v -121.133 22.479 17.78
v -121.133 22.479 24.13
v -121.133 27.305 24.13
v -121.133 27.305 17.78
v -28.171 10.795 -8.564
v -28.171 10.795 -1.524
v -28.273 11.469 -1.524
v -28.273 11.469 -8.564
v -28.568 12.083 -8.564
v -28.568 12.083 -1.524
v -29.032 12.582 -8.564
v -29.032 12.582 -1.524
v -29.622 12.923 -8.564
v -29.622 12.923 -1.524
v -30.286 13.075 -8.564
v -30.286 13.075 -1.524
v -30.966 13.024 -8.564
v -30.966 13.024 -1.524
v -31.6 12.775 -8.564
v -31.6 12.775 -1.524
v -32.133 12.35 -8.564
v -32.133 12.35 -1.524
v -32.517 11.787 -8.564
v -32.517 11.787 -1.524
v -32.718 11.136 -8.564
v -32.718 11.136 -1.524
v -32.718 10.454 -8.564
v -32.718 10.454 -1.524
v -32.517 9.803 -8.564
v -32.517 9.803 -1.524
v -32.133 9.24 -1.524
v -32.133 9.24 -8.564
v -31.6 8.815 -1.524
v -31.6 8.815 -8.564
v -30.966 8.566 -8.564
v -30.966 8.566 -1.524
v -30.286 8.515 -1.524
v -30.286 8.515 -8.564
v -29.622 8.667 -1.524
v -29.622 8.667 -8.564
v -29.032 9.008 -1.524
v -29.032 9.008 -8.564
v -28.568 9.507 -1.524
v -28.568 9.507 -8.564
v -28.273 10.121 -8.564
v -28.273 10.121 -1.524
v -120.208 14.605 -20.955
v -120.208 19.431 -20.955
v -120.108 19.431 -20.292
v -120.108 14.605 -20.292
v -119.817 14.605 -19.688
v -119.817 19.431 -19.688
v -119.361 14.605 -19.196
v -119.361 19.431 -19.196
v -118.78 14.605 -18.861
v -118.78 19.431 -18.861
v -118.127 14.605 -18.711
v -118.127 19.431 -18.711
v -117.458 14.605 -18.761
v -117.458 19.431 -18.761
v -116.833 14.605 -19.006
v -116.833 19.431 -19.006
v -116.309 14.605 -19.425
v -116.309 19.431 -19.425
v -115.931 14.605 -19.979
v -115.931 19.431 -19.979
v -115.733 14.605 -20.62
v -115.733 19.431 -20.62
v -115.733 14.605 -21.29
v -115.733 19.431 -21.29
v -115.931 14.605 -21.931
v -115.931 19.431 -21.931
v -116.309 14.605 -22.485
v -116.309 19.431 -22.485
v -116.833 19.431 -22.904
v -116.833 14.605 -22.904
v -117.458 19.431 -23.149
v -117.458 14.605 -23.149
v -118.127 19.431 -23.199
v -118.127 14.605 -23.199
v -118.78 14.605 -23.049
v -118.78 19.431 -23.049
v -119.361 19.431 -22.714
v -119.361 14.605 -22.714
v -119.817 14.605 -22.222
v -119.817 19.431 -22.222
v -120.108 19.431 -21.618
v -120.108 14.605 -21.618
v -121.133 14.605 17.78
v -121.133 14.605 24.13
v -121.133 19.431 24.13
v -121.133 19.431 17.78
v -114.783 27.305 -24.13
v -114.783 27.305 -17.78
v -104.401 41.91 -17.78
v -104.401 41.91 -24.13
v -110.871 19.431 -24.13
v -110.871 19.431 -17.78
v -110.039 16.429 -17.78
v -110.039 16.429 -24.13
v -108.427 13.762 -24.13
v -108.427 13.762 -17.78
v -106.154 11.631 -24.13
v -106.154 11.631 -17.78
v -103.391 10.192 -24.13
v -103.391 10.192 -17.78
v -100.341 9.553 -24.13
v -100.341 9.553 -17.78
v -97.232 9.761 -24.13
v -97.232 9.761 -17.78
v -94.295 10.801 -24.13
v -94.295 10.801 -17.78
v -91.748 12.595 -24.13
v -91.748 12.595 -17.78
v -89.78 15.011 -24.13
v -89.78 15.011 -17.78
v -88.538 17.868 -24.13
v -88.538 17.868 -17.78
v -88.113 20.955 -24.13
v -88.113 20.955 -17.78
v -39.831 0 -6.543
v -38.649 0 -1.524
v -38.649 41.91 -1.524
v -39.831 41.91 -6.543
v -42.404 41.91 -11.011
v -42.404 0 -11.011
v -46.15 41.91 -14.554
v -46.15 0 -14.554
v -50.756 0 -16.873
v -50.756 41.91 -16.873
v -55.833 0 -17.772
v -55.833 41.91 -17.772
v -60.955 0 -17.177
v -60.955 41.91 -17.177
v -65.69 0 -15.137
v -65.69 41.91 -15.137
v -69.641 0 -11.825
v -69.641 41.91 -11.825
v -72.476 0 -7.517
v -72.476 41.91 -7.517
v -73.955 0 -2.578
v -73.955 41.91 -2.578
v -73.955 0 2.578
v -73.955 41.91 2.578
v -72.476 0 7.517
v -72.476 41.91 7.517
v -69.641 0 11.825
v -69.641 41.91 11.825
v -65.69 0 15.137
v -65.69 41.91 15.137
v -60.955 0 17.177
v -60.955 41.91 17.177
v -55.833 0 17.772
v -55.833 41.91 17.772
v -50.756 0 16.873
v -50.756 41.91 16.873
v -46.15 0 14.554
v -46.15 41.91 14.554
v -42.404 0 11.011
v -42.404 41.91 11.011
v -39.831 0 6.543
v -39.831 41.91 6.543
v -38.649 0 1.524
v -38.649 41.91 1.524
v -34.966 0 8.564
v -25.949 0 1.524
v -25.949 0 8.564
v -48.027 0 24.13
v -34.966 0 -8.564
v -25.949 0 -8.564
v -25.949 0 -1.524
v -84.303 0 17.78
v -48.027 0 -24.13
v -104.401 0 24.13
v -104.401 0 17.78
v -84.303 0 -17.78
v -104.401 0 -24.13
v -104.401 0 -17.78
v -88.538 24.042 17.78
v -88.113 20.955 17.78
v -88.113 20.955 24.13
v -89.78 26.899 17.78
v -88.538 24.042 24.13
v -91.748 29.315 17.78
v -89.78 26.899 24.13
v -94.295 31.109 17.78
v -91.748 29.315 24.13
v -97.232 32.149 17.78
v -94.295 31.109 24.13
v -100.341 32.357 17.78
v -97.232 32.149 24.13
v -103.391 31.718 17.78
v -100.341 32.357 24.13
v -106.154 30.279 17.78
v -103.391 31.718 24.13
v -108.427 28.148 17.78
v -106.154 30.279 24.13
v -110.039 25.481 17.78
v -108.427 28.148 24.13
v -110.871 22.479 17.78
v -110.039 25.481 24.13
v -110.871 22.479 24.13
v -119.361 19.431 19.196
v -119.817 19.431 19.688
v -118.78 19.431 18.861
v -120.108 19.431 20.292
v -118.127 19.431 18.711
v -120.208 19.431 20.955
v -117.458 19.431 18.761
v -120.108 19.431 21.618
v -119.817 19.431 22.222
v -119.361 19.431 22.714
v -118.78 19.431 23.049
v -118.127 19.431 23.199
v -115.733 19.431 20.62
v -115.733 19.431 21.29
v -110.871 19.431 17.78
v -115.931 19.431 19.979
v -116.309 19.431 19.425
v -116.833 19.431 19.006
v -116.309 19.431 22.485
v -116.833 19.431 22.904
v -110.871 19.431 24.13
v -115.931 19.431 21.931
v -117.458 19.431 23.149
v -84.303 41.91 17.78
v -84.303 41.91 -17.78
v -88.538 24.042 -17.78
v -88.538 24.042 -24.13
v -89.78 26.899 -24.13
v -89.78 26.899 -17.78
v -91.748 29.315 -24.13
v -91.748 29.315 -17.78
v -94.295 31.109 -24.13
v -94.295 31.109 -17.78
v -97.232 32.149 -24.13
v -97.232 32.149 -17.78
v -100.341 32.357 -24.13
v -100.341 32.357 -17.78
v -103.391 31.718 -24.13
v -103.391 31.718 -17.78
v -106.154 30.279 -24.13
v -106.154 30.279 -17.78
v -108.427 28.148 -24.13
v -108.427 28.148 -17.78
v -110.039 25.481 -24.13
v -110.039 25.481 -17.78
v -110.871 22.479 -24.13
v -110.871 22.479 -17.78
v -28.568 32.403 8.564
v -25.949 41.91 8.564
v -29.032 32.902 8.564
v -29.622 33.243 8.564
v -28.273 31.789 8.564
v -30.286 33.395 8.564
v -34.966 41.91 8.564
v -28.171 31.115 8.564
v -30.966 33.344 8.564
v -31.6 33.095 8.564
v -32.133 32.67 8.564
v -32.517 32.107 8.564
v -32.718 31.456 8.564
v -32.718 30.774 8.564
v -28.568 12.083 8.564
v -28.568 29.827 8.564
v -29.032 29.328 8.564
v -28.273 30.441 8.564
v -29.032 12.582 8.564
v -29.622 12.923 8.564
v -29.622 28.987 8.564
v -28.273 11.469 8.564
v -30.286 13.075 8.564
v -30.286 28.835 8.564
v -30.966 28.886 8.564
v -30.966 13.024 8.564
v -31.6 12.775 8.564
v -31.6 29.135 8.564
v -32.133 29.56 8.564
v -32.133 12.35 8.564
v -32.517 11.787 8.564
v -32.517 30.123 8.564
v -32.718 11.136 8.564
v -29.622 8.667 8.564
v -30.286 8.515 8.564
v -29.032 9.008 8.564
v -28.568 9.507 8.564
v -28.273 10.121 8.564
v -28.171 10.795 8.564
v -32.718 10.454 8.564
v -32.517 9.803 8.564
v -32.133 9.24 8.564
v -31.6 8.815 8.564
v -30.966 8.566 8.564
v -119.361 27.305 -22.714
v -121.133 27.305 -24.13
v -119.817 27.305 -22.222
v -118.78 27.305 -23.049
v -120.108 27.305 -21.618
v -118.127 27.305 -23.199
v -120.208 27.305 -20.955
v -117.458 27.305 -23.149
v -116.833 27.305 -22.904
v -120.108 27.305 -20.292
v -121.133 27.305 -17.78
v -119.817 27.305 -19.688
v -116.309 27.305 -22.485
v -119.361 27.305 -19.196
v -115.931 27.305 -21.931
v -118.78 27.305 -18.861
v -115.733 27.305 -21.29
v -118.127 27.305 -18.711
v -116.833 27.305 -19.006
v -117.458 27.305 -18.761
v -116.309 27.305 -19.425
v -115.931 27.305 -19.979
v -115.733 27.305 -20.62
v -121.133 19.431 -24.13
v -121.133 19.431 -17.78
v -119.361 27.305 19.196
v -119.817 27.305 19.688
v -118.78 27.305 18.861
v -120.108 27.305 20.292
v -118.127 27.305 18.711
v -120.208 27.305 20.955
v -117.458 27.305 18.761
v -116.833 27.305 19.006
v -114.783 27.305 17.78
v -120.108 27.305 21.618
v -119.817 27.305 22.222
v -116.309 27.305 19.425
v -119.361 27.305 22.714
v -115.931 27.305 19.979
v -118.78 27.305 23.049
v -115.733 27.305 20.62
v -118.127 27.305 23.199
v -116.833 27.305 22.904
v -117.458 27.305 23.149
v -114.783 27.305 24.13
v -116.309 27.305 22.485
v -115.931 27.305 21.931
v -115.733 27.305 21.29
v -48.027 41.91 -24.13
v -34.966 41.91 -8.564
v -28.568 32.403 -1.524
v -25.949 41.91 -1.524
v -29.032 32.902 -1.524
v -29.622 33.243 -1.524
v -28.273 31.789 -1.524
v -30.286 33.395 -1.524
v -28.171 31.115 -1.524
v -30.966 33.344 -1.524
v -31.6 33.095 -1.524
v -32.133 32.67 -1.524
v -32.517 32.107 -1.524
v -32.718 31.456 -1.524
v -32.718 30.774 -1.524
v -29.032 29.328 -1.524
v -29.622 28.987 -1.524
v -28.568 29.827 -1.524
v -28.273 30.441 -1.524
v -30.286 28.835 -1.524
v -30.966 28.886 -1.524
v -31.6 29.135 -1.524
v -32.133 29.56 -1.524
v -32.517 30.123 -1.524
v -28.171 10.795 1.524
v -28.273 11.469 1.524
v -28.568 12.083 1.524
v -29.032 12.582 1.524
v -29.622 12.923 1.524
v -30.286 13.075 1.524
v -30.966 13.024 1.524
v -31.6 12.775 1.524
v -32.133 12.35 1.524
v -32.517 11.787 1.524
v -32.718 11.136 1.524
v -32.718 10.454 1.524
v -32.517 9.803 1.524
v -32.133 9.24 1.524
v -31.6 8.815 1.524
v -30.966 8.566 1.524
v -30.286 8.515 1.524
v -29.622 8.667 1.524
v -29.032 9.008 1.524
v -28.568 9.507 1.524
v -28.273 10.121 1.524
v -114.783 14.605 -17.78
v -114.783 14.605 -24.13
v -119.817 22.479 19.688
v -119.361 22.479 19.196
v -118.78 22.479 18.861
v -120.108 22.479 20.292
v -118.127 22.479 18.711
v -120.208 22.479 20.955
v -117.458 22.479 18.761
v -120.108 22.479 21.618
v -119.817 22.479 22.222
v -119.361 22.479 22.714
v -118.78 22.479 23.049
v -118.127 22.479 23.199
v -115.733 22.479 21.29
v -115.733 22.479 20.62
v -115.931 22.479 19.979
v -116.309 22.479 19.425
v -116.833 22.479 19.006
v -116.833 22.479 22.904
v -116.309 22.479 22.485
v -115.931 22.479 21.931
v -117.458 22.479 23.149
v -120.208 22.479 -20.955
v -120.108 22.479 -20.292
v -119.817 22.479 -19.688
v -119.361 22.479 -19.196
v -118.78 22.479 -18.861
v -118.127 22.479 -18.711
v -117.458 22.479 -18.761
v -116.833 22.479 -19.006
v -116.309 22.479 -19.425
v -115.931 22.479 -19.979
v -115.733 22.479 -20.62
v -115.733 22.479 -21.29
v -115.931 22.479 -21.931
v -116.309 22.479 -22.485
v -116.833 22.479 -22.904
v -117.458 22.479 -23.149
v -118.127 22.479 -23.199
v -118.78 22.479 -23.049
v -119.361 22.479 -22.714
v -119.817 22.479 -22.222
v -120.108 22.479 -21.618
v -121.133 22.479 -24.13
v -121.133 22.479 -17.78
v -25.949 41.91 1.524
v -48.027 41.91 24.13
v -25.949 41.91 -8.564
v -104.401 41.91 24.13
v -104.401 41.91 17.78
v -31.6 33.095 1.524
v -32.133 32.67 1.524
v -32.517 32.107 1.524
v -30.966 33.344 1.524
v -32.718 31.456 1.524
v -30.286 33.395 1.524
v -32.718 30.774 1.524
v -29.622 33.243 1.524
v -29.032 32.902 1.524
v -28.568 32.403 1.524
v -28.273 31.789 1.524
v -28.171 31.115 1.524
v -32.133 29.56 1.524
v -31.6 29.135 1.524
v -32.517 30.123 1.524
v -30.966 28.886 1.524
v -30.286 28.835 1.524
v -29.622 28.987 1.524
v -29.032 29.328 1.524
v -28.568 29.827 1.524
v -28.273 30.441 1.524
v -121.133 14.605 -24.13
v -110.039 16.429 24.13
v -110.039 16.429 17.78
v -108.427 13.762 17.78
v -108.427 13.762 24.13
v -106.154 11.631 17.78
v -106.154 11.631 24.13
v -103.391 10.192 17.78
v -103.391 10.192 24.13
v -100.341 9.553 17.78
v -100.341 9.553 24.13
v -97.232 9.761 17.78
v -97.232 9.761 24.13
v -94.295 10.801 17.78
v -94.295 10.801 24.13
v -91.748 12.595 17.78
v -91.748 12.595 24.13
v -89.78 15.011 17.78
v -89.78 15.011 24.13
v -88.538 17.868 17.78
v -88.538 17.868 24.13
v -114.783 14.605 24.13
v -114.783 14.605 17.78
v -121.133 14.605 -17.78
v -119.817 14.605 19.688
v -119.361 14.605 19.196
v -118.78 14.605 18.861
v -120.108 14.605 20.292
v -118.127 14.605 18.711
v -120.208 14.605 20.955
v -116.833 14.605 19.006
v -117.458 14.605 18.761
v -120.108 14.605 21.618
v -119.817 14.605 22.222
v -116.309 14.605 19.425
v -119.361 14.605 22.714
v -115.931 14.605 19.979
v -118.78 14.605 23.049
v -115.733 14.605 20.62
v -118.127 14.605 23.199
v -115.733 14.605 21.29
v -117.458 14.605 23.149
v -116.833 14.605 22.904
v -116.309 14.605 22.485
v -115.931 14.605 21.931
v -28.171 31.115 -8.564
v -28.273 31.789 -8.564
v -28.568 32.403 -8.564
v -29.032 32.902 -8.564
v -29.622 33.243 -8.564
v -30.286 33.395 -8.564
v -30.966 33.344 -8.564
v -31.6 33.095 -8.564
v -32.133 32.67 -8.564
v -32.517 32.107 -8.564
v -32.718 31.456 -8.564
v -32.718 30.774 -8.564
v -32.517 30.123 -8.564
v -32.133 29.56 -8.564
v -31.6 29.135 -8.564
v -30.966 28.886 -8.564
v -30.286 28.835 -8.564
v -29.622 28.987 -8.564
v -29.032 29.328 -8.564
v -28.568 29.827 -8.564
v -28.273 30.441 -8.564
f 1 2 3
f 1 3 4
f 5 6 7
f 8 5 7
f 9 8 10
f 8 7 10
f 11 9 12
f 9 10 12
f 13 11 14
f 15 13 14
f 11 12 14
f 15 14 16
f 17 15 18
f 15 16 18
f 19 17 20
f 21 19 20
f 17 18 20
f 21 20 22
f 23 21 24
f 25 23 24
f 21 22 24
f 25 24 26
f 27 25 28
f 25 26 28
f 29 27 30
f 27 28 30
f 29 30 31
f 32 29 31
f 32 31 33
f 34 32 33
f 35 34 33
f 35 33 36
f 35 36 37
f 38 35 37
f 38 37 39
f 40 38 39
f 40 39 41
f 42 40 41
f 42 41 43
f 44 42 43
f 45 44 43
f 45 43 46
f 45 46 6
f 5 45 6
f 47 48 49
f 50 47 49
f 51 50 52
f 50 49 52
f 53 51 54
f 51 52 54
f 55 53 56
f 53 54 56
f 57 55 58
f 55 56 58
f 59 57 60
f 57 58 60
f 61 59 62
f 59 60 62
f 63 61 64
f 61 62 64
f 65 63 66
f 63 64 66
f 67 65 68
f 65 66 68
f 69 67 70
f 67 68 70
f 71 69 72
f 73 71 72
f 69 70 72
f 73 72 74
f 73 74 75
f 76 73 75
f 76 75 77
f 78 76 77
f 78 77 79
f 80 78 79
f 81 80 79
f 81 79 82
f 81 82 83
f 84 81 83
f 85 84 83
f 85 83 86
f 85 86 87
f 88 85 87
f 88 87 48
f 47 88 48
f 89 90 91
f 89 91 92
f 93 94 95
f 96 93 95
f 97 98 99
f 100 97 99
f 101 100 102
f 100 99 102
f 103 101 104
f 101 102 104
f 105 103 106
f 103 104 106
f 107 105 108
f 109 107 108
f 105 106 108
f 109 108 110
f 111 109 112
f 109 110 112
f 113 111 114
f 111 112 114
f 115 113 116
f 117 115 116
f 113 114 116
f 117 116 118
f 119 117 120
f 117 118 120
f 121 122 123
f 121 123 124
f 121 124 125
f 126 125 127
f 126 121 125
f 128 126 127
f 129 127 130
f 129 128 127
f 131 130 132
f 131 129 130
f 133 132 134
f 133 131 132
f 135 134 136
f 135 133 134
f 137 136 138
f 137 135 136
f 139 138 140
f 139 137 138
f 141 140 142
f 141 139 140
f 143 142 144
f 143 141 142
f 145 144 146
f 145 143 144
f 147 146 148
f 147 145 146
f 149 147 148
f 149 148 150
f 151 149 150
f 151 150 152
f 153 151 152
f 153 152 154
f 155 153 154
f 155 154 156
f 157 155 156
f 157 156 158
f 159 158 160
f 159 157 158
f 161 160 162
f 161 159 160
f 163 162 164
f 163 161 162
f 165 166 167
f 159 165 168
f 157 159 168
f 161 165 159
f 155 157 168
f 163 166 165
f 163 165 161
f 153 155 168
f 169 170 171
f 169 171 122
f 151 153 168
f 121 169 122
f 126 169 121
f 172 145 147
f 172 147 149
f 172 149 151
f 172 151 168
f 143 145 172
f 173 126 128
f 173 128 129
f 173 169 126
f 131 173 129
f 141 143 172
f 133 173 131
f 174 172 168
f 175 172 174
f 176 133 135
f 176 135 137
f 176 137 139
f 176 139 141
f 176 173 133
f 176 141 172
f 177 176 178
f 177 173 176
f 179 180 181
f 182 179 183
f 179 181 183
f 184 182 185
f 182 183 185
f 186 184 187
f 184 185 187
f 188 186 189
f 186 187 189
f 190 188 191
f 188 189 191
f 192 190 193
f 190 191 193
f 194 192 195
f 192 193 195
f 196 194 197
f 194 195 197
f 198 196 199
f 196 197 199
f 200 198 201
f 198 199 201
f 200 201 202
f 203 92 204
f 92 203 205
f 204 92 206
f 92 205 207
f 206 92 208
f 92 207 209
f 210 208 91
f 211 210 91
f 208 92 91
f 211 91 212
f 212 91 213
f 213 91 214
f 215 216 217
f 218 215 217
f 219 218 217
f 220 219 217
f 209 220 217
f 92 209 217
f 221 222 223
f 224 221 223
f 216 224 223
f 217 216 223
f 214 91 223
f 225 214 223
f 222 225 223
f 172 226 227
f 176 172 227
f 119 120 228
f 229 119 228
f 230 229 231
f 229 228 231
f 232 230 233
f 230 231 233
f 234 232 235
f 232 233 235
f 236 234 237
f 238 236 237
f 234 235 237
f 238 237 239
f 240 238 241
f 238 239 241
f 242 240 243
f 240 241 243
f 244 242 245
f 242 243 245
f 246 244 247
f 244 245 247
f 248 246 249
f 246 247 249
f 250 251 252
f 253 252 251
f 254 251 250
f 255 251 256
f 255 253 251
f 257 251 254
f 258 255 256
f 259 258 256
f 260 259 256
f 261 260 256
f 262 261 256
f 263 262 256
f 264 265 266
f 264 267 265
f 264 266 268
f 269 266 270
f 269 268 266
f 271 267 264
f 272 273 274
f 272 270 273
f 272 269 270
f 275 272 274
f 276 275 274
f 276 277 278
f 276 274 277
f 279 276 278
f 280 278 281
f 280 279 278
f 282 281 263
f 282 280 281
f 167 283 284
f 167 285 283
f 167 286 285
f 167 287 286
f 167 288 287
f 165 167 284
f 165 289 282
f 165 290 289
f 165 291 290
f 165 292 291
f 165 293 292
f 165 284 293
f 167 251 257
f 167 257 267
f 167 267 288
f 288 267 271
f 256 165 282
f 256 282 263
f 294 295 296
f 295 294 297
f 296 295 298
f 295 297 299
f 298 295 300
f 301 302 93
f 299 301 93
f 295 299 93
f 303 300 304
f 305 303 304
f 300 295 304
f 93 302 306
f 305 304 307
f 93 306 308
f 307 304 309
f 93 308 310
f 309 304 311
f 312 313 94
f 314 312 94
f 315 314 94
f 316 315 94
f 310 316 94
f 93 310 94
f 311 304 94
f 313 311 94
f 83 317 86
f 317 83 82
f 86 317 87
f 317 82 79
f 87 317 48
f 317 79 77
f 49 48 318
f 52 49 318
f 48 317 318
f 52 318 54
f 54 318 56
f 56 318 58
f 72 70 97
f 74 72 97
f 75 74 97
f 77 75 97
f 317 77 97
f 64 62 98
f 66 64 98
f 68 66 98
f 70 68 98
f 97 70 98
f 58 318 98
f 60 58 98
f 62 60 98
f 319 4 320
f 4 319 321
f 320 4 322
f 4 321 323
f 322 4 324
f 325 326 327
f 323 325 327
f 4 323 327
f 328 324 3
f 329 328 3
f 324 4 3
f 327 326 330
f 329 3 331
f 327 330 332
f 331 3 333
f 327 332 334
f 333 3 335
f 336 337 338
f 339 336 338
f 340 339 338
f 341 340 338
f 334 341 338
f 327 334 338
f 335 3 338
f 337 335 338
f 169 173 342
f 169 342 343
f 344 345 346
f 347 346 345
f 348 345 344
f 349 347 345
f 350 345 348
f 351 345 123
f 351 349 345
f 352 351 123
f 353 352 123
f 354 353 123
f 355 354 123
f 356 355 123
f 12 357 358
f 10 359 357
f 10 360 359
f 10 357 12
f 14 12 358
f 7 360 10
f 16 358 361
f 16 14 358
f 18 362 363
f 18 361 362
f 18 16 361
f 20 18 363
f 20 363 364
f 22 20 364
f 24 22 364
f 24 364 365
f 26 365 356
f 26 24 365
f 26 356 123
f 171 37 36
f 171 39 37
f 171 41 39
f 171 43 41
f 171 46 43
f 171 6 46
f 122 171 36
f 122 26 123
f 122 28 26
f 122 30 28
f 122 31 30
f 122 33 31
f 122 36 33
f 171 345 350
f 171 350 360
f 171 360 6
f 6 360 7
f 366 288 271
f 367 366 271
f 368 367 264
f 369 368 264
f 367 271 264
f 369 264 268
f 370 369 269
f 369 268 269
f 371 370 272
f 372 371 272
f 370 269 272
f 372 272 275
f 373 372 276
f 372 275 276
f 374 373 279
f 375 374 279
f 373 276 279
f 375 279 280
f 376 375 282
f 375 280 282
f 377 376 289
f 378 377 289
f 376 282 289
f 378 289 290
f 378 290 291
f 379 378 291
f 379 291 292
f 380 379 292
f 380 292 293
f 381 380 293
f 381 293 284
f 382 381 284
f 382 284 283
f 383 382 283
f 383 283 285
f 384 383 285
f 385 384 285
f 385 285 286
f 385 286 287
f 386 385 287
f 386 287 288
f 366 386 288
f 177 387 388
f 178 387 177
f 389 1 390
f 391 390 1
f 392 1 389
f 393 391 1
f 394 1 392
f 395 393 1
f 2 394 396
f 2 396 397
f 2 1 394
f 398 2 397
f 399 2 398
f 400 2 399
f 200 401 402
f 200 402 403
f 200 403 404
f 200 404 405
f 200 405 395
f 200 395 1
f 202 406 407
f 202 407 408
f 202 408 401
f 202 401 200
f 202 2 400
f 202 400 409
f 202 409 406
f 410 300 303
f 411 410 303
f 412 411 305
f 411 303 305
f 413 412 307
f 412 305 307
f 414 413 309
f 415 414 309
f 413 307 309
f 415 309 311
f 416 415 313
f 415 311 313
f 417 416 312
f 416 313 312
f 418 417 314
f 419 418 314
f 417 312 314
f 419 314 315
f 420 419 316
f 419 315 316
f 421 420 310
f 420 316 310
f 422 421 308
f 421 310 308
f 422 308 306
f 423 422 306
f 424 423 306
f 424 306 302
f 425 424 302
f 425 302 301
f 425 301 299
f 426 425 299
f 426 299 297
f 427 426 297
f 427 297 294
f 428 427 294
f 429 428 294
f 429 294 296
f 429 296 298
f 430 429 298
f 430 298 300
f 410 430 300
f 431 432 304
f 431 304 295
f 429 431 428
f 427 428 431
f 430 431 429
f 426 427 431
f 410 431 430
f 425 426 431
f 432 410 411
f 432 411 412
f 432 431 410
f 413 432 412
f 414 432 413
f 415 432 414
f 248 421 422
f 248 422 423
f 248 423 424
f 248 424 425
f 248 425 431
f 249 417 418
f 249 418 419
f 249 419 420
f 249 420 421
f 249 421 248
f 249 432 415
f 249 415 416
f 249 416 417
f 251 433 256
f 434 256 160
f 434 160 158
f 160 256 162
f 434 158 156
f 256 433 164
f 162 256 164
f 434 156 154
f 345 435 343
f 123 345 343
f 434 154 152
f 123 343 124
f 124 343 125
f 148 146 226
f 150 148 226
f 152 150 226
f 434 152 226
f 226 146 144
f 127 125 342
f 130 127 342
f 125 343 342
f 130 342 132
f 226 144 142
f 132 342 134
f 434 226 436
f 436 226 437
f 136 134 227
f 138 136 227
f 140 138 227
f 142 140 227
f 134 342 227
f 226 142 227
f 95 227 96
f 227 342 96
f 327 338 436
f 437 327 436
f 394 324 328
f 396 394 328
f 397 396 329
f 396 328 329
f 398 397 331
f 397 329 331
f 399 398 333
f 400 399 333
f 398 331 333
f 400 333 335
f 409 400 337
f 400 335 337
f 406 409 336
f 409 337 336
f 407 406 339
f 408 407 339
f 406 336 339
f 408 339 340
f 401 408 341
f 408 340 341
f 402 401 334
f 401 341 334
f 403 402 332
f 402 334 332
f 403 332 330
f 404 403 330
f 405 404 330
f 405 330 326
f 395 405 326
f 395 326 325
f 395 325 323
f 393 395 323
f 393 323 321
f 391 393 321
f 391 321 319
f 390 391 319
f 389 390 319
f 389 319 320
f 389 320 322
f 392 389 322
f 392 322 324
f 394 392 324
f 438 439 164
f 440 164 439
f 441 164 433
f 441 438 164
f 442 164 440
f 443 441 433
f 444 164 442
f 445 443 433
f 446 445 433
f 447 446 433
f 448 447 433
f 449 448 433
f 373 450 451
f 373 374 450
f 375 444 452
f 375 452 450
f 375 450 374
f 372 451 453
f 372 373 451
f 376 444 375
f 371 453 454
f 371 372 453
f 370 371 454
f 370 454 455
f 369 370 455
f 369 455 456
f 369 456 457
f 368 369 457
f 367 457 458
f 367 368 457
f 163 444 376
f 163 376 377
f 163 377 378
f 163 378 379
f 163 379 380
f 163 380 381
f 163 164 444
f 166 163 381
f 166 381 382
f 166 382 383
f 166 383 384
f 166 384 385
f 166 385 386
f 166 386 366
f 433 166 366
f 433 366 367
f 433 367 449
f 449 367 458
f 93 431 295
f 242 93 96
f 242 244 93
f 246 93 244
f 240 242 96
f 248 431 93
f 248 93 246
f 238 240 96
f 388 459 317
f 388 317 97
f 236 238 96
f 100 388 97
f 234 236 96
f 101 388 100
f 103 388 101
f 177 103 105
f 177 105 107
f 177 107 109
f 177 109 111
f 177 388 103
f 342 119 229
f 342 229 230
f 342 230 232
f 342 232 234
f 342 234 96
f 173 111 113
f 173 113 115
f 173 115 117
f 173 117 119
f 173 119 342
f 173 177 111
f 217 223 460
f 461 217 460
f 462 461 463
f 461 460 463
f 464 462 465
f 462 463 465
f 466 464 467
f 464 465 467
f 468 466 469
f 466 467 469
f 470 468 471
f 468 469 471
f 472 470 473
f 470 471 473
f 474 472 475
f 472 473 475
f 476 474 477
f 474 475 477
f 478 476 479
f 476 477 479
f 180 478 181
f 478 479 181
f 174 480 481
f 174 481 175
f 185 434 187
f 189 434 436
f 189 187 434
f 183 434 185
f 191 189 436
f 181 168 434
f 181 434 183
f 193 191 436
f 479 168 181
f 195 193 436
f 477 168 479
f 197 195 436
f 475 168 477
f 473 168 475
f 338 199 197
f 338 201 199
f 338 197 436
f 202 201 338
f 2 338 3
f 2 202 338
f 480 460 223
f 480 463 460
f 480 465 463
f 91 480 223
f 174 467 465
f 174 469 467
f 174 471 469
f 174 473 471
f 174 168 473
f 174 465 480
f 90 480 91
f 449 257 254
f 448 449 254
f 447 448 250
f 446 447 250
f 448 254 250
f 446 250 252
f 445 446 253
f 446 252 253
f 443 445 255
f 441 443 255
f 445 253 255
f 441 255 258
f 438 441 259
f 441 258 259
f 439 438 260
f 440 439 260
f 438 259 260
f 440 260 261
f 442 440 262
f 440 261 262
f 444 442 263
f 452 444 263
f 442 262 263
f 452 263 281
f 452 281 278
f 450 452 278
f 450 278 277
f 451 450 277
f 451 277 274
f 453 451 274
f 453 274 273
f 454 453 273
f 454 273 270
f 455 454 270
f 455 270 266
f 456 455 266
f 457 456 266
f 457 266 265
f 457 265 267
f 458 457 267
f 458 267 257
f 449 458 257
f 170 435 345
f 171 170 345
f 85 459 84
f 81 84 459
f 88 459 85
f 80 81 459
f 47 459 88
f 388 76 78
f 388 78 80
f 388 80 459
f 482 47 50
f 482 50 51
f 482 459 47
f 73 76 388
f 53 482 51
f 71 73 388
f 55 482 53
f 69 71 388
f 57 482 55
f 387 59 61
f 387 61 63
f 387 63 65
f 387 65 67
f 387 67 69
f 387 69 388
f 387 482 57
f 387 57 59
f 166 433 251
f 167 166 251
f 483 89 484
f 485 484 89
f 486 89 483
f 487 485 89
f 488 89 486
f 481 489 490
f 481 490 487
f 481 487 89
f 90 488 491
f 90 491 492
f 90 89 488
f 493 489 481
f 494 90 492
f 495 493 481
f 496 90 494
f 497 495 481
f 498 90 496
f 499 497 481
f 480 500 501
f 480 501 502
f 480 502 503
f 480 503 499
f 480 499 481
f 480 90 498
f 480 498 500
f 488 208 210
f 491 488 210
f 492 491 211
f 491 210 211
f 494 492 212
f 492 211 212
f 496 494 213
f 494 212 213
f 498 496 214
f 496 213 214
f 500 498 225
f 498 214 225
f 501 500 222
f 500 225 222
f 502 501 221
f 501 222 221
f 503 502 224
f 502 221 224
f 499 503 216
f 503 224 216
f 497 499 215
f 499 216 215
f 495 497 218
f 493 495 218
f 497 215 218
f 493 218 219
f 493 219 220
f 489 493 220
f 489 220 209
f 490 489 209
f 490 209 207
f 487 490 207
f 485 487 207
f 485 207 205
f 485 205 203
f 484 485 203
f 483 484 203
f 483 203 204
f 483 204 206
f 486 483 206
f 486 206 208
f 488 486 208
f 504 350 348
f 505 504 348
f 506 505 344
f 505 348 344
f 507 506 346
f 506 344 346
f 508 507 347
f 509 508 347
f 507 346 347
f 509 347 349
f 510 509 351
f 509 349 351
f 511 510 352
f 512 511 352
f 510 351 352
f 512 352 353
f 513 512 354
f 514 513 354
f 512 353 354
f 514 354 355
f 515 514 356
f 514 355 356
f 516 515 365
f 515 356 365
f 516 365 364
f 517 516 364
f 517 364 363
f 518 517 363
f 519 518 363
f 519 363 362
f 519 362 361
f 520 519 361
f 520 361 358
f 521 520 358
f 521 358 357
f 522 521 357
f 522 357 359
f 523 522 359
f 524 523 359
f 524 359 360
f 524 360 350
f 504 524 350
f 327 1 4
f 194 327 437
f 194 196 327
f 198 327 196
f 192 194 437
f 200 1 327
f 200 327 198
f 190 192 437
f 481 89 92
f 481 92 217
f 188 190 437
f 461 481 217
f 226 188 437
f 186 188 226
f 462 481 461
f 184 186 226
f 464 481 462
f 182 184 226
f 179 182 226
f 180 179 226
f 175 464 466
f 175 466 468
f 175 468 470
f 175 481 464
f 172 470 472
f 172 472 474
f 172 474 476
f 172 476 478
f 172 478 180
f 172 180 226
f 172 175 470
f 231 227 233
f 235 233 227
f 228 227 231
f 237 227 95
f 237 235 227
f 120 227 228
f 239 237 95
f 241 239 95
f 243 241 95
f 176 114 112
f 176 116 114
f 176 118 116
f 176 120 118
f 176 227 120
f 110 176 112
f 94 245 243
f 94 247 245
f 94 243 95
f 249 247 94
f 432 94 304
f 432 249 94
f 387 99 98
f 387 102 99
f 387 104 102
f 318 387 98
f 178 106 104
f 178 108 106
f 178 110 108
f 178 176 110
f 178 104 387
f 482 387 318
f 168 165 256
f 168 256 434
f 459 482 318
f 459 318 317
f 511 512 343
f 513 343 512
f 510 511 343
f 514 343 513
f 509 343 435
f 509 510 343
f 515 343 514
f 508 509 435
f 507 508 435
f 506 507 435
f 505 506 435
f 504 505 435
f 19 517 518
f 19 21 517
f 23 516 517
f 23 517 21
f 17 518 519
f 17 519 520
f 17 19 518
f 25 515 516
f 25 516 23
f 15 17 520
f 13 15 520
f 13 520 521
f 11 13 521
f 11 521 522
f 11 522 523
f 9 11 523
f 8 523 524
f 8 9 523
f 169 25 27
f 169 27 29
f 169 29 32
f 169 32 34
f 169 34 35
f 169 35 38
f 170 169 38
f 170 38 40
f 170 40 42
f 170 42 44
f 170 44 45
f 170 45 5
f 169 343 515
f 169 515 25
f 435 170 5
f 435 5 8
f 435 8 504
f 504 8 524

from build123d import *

# Parameters (mm, degrees)
BOSS_EXTRUDE1_DEPTH = 41.91
SKETCH2_R           = 11.43
CUT_EXTRUDE1_DEPTH  = 56.388
SKETCH3_W           = 21.064654828
SKETCH3_H           = 1.524
CUT_EXTRUDE3_DEPTH  = 56.388
SKETCH4_R           = 2.2499955
CUT_EXTRUDE4_DEPTH  = 56.388
SKETCH5_R           = 2.286
CUT_EXTRUDE5_DEPTH  = 56.388


with BuildPart() as part:
    # Sketch1 → Boss-Extrude1 (new body)
    with BuildSketch(Plane(origin=(0, 0, 0), x_dir=(1, 0, 0), z_dir=(0, 1, 0))):
        with BuildLine():
            Line((-121.13336204, 24.13), (-48.027058794, 24.13))
            Line((-48.027058794, 24.13), (-34.965614565, 8.563976916))
            Line((-34.965614565, 8.563976916), (-25.948796733, 8.563976916))
            Line((-25.948796733, 8.563976916), (-25.948796733, 1.524))
            Line((-25.948796733, 1.524), (-38.648796733, 1.524))
            ThreePointArc((-38.648796733, 1.524), (-74.14336204, 0), (-38.648796733, -1.524))
            Line((-38.648796733, -1.524), (-25.948796733, -1.524))
            Line((-25.948796733, -1.524), (-25.948796733, -8.563976916))
            Line((-25.948796733, -8.563976916), (-34.965614565, -8.563976916))
            Line((-34.965614565, -8.563976916), (-48.027058794, -24.13))
            Line((-48.027058794, -24.13), (-121.13336204, -24.13))
            Line((-121.13336204, -24.13), (-121.13336204, -17.78))
            Line((-121.13336204, -17.78), (-84.30336204, -17.78))
            Line((-84.30336204, -17.78), (-84.30336204, 17.78))
            Line((-84.30336204, 17.78), (-121.13336204, 17.78))
            Line((-121.13336204, 17.78), (-121.13336204, 24.13))
        make_face()
    extrude(amount=BOSS_EXTRUDE1_DEPTH)

    # Sketch2 → Cut-Extrude1 (cut)
    with BuildSketch(Plane.XY.offset(24.13)):
        with Locations((-99.54336204, 20.955)):
            Circle(SKETCH2_R)
    extrude(amount=-CUT_EXTRUDE1_DEPTH, mode=Mode.SUBTRACT)

    # Sketch3 → Cut-Extrude3 (cut)
    with BuildSketch(Plane.XY.offset(24.13)):
        Polygon((-121.13336204, 14.605), (-114.78336204, 14.605), (-104.400968543, 0), (-121.13336204, 0), align=None)
        Polygon((-104.400968543, 41.91), (-121.13336204, 41.91), (-121.13336204, 27.305), (-114.78336204, 27.305), align=None)
        with Locations((-110.601034626, 20.193)):
            Rectangle(SKETCH3_W, SKETCH3_H)
        with Locations((-110.601034626, 21.717)):
            Rectangle(SKETCH3_W, SKETCH3_H)
    extrude(amount=-CUT_EXTRUDE3_DEPTH, mode=Mode.SUBTRACT)

    # Sketch4 → Cut-Extrude4 (cut)
    with BuildSketch(Plane(origin=(0, 27.305, 0), x_dir=(1, 0, 0), z_dir=(0, 1, 0))):
        with Locations(Location((-117.95836204, 20.955, 0), (0, 0, 180))):
            Circle(SKETCH4_R)
        with Locations(Location((-117.95836204, -20.955, 0), (0, 0, 180))):
            Circle(SKETCH4_R)
    extrude(amount=-CUT_EXTRUDE4_DEPTH, mode=Mode.SUBTRACT)

    # Sketch5 → Cut-Extrude5 (cut)
    with BuildSketch(Plane.XY.offset(8.563976916)):
        with Locations((-30.457205649, 31.115)):
            Circle(SKETCH5_R)
        with Locations((-30.457205649, 10.795)):
            Circle(SKETCH5_R)
    extrude(amount=-CUT_EXTRUDE5_DEPTH, mode=Mode.SUBTRACT)


solid = part.part
